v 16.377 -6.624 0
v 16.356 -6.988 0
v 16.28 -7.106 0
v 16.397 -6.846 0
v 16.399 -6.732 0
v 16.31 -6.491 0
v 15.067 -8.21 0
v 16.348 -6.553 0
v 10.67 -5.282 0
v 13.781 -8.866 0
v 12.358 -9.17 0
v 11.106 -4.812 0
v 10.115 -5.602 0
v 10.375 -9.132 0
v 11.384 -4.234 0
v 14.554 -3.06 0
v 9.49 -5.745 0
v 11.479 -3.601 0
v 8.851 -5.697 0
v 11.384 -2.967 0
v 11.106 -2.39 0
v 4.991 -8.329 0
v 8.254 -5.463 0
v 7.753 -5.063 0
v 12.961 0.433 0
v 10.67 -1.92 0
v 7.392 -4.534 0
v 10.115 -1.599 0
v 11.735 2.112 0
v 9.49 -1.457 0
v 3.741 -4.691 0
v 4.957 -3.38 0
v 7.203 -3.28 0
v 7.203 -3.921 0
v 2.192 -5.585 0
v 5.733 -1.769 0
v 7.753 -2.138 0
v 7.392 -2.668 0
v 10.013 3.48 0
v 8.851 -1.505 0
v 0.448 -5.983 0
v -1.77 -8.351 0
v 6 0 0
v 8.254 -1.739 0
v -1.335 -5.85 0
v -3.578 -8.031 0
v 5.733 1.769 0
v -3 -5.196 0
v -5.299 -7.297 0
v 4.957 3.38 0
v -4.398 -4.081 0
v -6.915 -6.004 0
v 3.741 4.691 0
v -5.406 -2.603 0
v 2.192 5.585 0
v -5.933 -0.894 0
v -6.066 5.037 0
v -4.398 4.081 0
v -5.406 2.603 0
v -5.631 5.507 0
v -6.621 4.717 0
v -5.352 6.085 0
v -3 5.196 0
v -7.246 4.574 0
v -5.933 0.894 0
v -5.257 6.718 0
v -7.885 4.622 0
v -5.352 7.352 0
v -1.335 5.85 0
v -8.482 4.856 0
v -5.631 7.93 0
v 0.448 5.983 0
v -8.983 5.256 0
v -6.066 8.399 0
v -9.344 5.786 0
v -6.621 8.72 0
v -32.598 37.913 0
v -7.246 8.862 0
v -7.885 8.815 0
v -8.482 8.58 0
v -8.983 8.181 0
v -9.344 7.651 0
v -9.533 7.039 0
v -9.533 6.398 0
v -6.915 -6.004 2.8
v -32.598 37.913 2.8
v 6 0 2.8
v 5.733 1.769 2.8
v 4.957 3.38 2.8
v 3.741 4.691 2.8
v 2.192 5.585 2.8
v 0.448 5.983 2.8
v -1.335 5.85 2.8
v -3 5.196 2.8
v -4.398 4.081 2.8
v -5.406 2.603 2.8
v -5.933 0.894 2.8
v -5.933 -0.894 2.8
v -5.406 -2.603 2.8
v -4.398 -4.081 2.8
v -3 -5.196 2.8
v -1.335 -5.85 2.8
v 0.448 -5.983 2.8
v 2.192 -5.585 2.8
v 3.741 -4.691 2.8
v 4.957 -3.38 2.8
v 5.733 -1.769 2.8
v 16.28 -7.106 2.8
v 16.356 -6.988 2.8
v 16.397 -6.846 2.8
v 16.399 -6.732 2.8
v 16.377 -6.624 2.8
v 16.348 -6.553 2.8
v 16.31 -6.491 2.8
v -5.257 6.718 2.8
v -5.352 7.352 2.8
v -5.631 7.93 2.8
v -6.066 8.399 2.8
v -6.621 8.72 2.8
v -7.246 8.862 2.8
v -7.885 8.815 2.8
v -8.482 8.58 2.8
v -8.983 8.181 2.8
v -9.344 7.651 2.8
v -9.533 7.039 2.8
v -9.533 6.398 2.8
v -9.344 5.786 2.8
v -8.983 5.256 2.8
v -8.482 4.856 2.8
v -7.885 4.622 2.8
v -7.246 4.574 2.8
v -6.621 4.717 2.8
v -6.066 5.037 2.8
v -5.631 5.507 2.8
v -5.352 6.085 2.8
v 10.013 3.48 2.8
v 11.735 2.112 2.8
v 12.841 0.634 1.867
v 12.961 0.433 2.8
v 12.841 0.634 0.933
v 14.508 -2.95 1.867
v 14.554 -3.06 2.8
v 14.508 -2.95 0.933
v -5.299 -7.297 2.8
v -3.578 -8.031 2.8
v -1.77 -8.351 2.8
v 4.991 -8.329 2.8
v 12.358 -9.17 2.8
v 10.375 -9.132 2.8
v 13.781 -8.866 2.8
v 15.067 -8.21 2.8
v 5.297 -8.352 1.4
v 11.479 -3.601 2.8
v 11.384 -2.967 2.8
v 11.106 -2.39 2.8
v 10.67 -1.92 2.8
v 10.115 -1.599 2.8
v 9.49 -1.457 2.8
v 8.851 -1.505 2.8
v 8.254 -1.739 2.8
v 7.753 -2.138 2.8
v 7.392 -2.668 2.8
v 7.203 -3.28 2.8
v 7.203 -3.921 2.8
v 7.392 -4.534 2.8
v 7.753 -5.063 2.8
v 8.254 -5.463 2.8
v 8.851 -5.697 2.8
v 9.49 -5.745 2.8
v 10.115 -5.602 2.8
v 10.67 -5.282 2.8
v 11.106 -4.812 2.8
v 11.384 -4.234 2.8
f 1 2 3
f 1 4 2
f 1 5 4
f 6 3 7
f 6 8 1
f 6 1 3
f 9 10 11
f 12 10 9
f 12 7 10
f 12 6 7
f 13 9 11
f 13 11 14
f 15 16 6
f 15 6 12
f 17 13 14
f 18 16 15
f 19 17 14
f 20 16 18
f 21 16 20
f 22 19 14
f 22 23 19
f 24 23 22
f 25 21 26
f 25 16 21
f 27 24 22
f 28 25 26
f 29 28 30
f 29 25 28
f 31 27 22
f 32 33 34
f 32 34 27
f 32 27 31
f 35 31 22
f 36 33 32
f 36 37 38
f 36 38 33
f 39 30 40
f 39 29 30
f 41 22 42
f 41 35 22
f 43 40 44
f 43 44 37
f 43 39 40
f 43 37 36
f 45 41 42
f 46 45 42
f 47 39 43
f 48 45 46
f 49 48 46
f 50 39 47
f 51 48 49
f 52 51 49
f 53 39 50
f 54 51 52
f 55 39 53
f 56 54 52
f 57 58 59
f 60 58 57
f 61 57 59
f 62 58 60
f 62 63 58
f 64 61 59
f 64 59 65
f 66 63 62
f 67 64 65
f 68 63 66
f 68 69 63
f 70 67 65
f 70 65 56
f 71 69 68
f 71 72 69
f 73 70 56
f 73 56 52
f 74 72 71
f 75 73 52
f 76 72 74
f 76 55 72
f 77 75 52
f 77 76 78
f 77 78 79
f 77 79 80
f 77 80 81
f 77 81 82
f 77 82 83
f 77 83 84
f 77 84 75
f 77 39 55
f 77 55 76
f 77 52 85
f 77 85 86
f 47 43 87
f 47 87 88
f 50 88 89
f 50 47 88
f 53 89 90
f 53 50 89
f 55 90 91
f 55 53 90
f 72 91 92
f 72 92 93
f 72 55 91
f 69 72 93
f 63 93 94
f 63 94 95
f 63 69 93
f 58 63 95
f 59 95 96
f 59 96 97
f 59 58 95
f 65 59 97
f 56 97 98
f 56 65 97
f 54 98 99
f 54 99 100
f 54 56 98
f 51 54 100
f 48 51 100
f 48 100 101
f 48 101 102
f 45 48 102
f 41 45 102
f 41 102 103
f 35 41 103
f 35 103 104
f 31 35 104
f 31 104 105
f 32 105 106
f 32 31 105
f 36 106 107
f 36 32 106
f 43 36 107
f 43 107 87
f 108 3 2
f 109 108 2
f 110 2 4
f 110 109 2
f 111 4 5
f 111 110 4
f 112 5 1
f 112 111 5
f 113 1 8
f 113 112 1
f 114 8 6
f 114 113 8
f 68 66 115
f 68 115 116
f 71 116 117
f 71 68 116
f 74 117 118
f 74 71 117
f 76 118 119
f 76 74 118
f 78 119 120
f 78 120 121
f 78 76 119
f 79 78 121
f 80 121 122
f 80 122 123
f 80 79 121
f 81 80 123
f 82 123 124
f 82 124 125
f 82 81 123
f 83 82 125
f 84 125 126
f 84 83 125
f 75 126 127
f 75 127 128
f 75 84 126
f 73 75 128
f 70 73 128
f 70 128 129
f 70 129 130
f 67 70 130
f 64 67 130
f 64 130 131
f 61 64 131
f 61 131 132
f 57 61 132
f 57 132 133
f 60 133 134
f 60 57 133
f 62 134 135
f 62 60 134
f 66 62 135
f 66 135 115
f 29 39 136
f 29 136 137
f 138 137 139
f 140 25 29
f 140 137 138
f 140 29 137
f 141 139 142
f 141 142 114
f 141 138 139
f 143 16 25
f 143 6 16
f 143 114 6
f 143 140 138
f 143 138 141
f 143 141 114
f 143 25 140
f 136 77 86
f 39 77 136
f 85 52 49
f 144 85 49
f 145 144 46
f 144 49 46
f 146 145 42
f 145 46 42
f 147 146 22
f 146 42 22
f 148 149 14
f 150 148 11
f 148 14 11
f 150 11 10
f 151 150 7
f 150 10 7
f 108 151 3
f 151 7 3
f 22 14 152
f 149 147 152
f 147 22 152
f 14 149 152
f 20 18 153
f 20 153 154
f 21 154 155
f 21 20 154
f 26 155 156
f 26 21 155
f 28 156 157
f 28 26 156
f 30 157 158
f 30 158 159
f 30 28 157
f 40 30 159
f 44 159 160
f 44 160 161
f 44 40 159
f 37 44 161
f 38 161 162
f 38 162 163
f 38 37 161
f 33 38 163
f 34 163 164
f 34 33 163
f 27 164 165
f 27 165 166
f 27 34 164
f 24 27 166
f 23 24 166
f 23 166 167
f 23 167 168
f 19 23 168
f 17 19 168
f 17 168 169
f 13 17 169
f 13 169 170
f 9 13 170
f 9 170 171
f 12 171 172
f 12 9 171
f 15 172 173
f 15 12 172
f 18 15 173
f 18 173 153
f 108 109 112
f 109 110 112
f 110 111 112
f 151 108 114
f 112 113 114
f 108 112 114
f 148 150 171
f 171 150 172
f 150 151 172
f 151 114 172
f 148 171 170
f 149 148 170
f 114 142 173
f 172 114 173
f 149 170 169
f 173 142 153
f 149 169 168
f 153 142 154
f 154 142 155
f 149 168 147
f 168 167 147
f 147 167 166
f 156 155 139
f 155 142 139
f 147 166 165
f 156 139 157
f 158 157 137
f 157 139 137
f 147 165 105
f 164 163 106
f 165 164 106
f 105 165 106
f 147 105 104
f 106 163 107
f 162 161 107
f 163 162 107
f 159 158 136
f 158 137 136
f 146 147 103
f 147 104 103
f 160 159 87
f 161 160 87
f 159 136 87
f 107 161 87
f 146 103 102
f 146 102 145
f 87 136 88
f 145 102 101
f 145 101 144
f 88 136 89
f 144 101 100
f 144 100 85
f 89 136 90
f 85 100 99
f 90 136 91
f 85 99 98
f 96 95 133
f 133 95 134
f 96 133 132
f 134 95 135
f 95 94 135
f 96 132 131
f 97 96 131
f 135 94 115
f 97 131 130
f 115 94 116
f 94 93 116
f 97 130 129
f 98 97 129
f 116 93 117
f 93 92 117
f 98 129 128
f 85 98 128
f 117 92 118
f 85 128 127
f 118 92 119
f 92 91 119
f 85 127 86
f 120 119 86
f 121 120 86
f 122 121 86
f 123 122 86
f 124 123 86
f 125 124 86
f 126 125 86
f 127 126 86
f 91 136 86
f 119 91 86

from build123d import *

# Parameters (mm, degrees)
SKETCH1_R           = 6
SKETCH1_R_2         = 2.15
BOSS_EXTRUDE3_DEPTH = 2.8
FILLET2_R           = 0.5


with BuildPart() as part:
    # Sketch1 → Boss-Extrude3 (new body)
    with BuildSketch(Plane.XY):
        with BuildLine():
            Line((-6.914903584, -6.003890728), (-32.597767901, 37.912867577))
            Line((-32.597767901, 37.912867577), (10.012592639, 3.48020667))
            add(Edge.make_bspline(
                [(10.012592639, 3.48020667), (13.976241168, 1.192727745), (14.014521415, -3.518986682), (16.534972158, -6.795729316)],
                knots=[0, 0, 0, 0, 1, 1, 1, 1], degree=3))
            add(Edge.make_bspline(
                [(-6.914903584, -6.003890728), (-3.45265208, -9.610347217), (5.034074198, -6.462522657), (13.416090218, -10.783276778), (16.534972158, -6.795729316)],
                knots=[0, 0, 0, 0, 0.517120054, 1, 1, 1, 1], degree=3))
        make_face()
        Circle(SKETCH1_R, mode=Mode.SUBTRACT)
        with Locations((-7.406949835, 6.718414556)):
            Circle(SKETCH1_R_2, mode=Mode.SUBTRACT)
        with Locations((9.329230051, -3.600759177)):
            Circle(SKETCH1_R_2, mode=Mode.SUBTRACT)
    extrude(amount=BOSS_EXTRUDE3_DEPTH)

    # Fillet2
    fillet2_edges = [part.edges().sort_by_distance(p)[0] for p in [
        (16.534972158, -6.795729316, 1.4),
    ]]
    fillet(fillet2_edges, radius=FILLET2_R)


solid = part.part
